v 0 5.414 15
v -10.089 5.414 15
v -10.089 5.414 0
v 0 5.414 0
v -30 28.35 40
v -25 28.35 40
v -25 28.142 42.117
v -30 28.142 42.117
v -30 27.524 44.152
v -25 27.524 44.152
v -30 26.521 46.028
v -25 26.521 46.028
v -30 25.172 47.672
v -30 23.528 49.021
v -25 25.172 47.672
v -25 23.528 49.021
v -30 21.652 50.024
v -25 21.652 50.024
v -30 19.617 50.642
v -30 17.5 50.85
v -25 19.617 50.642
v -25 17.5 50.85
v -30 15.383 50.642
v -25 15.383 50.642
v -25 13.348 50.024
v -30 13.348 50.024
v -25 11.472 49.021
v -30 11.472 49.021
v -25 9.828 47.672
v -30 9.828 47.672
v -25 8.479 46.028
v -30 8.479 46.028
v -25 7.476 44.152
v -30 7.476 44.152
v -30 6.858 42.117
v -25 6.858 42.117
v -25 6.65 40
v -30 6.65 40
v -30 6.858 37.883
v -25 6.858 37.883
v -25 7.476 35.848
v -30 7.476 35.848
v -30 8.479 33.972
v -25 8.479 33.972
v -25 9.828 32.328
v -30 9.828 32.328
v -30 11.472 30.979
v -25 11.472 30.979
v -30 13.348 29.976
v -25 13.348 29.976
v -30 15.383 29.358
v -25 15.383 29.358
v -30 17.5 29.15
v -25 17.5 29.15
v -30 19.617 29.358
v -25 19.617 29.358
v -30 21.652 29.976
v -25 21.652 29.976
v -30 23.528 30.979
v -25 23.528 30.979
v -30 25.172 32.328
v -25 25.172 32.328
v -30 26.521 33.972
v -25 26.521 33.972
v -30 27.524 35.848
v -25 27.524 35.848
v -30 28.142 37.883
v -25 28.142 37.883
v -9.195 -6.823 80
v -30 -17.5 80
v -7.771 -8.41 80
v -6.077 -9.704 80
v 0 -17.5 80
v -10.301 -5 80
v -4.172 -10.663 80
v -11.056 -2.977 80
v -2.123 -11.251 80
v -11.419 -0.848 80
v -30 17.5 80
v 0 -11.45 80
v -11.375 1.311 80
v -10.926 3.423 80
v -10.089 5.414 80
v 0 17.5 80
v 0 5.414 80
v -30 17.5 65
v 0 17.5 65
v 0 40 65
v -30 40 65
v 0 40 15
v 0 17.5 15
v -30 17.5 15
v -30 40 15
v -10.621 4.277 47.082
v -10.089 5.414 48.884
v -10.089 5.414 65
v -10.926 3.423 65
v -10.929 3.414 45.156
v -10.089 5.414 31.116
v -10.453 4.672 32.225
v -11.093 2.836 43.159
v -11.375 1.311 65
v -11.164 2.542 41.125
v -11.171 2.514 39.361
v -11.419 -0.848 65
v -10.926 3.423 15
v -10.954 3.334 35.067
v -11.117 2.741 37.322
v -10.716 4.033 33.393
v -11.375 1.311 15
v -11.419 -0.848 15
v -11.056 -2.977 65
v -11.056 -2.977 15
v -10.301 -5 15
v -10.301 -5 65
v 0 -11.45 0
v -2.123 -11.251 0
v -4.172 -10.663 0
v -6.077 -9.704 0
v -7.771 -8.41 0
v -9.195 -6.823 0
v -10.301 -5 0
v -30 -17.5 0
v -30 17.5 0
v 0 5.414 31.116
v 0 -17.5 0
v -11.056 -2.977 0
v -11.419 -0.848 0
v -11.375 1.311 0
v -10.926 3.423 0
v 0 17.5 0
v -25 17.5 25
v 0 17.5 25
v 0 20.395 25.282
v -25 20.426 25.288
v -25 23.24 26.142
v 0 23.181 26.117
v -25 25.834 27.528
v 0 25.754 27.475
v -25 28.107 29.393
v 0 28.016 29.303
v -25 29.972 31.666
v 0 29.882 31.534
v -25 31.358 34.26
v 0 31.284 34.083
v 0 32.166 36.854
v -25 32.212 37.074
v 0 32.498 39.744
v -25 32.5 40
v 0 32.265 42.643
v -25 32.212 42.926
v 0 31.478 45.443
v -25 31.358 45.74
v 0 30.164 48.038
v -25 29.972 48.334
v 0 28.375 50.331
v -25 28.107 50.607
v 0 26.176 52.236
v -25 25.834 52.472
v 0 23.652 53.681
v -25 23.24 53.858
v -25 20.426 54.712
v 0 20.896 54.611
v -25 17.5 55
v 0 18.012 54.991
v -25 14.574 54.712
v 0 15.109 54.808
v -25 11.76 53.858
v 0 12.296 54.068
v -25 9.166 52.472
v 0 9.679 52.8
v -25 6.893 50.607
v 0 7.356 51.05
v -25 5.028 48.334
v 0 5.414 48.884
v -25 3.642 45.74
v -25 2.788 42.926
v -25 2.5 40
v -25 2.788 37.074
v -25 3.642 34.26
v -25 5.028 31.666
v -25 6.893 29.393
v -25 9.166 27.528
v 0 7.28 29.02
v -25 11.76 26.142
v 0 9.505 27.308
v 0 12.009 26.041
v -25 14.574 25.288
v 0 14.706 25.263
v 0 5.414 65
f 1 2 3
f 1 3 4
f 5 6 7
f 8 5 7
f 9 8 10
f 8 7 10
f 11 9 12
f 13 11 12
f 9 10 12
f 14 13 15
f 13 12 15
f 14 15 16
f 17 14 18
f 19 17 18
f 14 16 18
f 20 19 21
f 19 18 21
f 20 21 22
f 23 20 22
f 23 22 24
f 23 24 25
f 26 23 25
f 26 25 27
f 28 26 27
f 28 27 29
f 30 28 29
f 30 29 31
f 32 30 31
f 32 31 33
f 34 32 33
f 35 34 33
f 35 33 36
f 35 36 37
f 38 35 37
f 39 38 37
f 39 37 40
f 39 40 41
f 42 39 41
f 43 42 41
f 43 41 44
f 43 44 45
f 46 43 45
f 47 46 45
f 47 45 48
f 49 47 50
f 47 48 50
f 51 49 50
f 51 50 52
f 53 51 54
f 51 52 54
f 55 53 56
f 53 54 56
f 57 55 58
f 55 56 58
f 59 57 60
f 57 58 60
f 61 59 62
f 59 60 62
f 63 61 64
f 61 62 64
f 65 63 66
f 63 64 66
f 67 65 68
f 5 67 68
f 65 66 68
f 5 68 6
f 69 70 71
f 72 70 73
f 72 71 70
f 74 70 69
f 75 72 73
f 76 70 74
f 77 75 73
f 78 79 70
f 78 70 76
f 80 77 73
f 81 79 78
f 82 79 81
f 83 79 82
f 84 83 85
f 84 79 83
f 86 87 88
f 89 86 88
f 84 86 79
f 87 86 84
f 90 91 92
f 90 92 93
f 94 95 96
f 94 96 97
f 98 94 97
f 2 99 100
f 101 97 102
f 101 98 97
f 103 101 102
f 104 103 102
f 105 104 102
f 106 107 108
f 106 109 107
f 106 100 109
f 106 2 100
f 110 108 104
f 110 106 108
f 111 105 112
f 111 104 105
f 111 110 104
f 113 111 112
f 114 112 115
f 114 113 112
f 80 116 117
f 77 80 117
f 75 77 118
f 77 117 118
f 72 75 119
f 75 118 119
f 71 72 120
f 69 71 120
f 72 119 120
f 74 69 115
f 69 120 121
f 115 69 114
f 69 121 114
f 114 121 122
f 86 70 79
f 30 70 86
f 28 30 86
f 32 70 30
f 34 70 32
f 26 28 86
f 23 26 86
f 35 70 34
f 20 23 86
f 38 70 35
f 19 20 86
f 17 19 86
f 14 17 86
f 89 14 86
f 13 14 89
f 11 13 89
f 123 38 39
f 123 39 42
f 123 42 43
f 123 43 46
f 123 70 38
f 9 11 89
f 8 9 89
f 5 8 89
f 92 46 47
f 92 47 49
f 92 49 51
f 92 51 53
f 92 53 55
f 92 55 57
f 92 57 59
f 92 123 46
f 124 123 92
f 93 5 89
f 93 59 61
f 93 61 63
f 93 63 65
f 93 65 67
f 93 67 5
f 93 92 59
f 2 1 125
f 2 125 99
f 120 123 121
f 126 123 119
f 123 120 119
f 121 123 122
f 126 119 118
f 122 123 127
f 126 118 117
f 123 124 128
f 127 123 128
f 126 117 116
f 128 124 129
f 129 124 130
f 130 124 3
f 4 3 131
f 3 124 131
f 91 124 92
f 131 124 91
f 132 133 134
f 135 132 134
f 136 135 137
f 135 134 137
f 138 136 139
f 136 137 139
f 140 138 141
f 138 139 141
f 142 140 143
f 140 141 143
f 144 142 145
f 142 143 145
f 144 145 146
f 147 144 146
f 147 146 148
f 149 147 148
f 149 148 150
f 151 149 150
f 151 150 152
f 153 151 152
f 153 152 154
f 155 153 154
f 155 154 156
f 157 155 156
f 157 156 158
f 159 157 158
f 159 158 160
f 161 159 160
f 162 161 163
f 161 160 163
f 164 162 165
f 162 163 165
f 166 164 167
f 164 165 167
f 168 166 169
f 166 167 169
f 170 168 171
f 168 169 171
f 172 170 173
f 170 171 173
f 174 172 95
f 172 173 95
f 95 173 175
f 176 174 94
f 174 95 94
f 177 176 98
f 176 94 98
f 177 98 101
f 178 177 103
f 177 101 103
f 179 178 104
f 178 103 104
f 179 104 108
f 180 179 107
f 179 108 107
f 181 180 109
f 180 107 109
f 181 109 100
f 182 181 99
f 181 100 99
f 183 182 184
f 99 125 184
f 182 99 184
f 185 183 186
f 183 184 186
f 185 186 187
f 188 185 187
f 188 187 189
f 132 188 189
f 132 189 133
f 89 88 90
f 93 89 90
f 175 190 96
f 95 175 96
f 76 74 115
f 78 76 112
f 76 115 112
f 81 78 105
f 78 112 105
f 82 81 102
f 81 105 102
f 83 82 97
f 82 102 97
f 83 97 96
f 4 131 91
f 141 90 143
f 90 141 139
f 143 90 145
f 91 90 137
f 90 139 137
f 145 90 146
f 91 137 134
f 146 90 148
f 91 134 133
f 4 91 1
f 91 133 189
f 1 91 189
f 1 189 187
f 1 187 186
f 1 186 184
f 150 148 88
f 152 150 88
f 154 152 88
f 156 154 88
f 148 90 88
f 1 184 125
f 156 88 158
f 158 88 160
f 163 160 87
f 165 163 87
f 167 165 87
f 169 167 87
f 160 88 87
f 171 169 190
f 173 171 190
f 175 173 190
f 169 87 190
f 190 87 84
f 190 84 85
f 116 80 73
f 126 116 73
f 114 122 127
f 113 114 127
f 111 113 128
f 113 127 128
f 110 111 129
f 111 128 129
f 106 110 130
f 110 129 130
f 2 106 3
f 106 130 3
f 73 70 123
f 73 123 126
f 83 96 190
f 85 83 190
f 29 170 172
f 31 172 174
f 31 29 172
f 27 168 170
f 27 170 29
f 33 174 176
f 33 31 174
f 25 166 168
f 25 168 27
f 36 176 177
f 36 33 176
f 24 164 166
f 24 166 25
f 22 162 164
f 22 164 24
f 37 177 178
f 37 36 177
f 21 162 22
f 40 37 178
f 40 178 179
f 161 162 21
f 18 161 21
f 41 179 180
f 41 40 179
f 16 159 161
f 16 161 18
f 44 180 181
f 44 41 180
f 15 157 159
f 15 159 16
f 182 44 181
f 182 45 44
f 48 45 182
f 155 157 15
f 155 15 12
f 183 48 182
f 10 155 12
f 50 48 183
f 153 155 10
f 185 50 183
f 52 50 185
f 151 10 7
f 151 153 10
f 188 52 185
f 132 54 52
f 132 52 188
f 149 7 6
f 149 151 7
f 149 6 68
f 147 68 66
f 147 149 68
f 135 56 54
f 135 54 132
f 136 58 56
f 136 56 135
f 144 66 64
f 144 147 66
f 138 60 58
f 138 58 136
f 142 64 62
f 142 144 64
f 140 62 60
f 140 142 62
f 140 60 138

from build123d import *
from build123d.topology import SkipClean

# Parameters (mm, degrees)
SKETCH2_W           = 60
SKETCH2_H           = 35
BOSS_EXTRUDE1_DEPTH = 80
BOSS_EXTRUDE2_REACH = 103.52
SKETCH3_W           = 50
SKETCH3_H           = 45
SKETCH3_R           = 5
SKETCH4_R           = 10.85
CUT_EXTRUDE1_DEPTH  = 80
CUT_EXTRUDE2_START  = -80
CUT_EXTRUDE2_DEPTH  = 80
CUT_EXTRUDE3_DEPTH  = 80
SKETCH8_R           = 15
CUT_EXTRUDE5_DEPTH  = 25


with BuildPart() as part:
    # Sketch2 → Boss-Extrude1 (new body)
    with BuildSketch(Plane.XY):
        Rectangle(SKETCH2_W, SKETCH2_H)
        with BuildLine():
            Line((-10.089226223, 5.413872387), (10.089226223, 5.413872387))
            ThreePointArc((10.089226223, 5.413872387), (0, -11.45), (-10.089226223, 5.413872387))
        make_face(mode=Mode.SUBTRACT)
    extrude(amount=BOSS_EXTRUDE1_DEPTH)

    # Boss-Extrude2: up to this face of the body (flat: up to its plane)
    boss_extrude2_end = Plane(part.part.faces().sort_by_distance((-30, 0, 40))[0])
    # Sketch3 → Boss-Extrude2 (add, up to the picked face)
    with BuildSketch(Plane(origin=(30, 0, 0), x_dir=(0, 0, -1), z_dir=(1, 0, 0)), mode=Mode.PRIVATE) as boss_extrude2_sk1:
        with Locations((-40, 17.5)):
            Rectangle(SKETCH3_W, SKETCH3_H)
        with Locations((-40, 17.5)):
            Circle(SKETCH3_R, mode=Mode.SUBTRACT)
    boss_extrude2_tool1 = split(extrude(boss_extrude2_sk1.sketch, amount=-BOSS_EXTRUDE2_REACH, mode=Mode.PRIVATE), bisect_by=boss_extrude2_end, keep=Keep.BOTH, mode=Mode.PRIVATE)
    add(boss_extrude2_tool1.solids().sort_by(Axis((30, -4.327319, 40), (-1, 0, 0)))[0])

    # Sketch4 → Cut-Extrude1 (cut)
    with BuildSketch(Plane(origin=(30, 0, 0), x_dir=(0, 0, -1), z_dir=(1, 0, 0))):
        with Locations(Location((-40, 17.5, 0), (0, 0, 90))):
            Circle(SKETCH4_R)
    extrude(amount=-CUT_EXTRUDE1_DEPTH, mode=Mode.SUBTRACT)

    # Sketch5 → Cut-Extrude2 (cut)
    with SkipClean():  # the faces are left unmerged after this step: merging them gives an invalid solid
        with BuildSketch(Plane.XY.offset(80).offset(CUT_EXTRUDE2_START)):
            with BuildLine():
                Line((-10.300606778, -5), (10.300606778, -5))
                ThreePointArc((10.300606778, -5), (11.447641983, 0.232363988), (10.089226223, 5.413872387))
                Line((10.089226223, 5.413872387), (-10.089226223, 5.413872387))
                ThreePointArc((-10.089226223, 5.413872387), (-11.447641983, 0.232363988), (-10.300606778, -5))
            make_face()
        extrude(amount=CUT_EXTRUDE2_DEPTH, mode=Mode.SUBTRACT)

    # Sketch6 → Cut-Extrude3 (cut)
    with SkipClean():  # the faces are left unmerged after this step: merging them gives an invalid solid
        with BuildSketch(Plane.XY.offset(80)):
            Polygon((0, 0), (0, 40), (30, 40), (30, -17.5), (0, -17.5), align=None)
        extrude(amount=-CUT_EXTRUDE3_DEPTH, mode=Mode.SUBTRACT)

    # Sketch8 → Cut-Extrude5 (cut)
    with SkipClean():  # the faces are left unmerged after this step: merging them gives an invalid solid
        with BuildSketch(Plane(origin=(0, 0, 0), x_dir=(0, 0, -1), z_dir=(1, 0, 0))):
            with Locations((-40, 17.5)):
                Circle(SKETCH8_R)
        extrude(amount=-CUT_EXTRUDE5_DEPTH, mode=Mode.SUBTRACT)


solid = part.part
